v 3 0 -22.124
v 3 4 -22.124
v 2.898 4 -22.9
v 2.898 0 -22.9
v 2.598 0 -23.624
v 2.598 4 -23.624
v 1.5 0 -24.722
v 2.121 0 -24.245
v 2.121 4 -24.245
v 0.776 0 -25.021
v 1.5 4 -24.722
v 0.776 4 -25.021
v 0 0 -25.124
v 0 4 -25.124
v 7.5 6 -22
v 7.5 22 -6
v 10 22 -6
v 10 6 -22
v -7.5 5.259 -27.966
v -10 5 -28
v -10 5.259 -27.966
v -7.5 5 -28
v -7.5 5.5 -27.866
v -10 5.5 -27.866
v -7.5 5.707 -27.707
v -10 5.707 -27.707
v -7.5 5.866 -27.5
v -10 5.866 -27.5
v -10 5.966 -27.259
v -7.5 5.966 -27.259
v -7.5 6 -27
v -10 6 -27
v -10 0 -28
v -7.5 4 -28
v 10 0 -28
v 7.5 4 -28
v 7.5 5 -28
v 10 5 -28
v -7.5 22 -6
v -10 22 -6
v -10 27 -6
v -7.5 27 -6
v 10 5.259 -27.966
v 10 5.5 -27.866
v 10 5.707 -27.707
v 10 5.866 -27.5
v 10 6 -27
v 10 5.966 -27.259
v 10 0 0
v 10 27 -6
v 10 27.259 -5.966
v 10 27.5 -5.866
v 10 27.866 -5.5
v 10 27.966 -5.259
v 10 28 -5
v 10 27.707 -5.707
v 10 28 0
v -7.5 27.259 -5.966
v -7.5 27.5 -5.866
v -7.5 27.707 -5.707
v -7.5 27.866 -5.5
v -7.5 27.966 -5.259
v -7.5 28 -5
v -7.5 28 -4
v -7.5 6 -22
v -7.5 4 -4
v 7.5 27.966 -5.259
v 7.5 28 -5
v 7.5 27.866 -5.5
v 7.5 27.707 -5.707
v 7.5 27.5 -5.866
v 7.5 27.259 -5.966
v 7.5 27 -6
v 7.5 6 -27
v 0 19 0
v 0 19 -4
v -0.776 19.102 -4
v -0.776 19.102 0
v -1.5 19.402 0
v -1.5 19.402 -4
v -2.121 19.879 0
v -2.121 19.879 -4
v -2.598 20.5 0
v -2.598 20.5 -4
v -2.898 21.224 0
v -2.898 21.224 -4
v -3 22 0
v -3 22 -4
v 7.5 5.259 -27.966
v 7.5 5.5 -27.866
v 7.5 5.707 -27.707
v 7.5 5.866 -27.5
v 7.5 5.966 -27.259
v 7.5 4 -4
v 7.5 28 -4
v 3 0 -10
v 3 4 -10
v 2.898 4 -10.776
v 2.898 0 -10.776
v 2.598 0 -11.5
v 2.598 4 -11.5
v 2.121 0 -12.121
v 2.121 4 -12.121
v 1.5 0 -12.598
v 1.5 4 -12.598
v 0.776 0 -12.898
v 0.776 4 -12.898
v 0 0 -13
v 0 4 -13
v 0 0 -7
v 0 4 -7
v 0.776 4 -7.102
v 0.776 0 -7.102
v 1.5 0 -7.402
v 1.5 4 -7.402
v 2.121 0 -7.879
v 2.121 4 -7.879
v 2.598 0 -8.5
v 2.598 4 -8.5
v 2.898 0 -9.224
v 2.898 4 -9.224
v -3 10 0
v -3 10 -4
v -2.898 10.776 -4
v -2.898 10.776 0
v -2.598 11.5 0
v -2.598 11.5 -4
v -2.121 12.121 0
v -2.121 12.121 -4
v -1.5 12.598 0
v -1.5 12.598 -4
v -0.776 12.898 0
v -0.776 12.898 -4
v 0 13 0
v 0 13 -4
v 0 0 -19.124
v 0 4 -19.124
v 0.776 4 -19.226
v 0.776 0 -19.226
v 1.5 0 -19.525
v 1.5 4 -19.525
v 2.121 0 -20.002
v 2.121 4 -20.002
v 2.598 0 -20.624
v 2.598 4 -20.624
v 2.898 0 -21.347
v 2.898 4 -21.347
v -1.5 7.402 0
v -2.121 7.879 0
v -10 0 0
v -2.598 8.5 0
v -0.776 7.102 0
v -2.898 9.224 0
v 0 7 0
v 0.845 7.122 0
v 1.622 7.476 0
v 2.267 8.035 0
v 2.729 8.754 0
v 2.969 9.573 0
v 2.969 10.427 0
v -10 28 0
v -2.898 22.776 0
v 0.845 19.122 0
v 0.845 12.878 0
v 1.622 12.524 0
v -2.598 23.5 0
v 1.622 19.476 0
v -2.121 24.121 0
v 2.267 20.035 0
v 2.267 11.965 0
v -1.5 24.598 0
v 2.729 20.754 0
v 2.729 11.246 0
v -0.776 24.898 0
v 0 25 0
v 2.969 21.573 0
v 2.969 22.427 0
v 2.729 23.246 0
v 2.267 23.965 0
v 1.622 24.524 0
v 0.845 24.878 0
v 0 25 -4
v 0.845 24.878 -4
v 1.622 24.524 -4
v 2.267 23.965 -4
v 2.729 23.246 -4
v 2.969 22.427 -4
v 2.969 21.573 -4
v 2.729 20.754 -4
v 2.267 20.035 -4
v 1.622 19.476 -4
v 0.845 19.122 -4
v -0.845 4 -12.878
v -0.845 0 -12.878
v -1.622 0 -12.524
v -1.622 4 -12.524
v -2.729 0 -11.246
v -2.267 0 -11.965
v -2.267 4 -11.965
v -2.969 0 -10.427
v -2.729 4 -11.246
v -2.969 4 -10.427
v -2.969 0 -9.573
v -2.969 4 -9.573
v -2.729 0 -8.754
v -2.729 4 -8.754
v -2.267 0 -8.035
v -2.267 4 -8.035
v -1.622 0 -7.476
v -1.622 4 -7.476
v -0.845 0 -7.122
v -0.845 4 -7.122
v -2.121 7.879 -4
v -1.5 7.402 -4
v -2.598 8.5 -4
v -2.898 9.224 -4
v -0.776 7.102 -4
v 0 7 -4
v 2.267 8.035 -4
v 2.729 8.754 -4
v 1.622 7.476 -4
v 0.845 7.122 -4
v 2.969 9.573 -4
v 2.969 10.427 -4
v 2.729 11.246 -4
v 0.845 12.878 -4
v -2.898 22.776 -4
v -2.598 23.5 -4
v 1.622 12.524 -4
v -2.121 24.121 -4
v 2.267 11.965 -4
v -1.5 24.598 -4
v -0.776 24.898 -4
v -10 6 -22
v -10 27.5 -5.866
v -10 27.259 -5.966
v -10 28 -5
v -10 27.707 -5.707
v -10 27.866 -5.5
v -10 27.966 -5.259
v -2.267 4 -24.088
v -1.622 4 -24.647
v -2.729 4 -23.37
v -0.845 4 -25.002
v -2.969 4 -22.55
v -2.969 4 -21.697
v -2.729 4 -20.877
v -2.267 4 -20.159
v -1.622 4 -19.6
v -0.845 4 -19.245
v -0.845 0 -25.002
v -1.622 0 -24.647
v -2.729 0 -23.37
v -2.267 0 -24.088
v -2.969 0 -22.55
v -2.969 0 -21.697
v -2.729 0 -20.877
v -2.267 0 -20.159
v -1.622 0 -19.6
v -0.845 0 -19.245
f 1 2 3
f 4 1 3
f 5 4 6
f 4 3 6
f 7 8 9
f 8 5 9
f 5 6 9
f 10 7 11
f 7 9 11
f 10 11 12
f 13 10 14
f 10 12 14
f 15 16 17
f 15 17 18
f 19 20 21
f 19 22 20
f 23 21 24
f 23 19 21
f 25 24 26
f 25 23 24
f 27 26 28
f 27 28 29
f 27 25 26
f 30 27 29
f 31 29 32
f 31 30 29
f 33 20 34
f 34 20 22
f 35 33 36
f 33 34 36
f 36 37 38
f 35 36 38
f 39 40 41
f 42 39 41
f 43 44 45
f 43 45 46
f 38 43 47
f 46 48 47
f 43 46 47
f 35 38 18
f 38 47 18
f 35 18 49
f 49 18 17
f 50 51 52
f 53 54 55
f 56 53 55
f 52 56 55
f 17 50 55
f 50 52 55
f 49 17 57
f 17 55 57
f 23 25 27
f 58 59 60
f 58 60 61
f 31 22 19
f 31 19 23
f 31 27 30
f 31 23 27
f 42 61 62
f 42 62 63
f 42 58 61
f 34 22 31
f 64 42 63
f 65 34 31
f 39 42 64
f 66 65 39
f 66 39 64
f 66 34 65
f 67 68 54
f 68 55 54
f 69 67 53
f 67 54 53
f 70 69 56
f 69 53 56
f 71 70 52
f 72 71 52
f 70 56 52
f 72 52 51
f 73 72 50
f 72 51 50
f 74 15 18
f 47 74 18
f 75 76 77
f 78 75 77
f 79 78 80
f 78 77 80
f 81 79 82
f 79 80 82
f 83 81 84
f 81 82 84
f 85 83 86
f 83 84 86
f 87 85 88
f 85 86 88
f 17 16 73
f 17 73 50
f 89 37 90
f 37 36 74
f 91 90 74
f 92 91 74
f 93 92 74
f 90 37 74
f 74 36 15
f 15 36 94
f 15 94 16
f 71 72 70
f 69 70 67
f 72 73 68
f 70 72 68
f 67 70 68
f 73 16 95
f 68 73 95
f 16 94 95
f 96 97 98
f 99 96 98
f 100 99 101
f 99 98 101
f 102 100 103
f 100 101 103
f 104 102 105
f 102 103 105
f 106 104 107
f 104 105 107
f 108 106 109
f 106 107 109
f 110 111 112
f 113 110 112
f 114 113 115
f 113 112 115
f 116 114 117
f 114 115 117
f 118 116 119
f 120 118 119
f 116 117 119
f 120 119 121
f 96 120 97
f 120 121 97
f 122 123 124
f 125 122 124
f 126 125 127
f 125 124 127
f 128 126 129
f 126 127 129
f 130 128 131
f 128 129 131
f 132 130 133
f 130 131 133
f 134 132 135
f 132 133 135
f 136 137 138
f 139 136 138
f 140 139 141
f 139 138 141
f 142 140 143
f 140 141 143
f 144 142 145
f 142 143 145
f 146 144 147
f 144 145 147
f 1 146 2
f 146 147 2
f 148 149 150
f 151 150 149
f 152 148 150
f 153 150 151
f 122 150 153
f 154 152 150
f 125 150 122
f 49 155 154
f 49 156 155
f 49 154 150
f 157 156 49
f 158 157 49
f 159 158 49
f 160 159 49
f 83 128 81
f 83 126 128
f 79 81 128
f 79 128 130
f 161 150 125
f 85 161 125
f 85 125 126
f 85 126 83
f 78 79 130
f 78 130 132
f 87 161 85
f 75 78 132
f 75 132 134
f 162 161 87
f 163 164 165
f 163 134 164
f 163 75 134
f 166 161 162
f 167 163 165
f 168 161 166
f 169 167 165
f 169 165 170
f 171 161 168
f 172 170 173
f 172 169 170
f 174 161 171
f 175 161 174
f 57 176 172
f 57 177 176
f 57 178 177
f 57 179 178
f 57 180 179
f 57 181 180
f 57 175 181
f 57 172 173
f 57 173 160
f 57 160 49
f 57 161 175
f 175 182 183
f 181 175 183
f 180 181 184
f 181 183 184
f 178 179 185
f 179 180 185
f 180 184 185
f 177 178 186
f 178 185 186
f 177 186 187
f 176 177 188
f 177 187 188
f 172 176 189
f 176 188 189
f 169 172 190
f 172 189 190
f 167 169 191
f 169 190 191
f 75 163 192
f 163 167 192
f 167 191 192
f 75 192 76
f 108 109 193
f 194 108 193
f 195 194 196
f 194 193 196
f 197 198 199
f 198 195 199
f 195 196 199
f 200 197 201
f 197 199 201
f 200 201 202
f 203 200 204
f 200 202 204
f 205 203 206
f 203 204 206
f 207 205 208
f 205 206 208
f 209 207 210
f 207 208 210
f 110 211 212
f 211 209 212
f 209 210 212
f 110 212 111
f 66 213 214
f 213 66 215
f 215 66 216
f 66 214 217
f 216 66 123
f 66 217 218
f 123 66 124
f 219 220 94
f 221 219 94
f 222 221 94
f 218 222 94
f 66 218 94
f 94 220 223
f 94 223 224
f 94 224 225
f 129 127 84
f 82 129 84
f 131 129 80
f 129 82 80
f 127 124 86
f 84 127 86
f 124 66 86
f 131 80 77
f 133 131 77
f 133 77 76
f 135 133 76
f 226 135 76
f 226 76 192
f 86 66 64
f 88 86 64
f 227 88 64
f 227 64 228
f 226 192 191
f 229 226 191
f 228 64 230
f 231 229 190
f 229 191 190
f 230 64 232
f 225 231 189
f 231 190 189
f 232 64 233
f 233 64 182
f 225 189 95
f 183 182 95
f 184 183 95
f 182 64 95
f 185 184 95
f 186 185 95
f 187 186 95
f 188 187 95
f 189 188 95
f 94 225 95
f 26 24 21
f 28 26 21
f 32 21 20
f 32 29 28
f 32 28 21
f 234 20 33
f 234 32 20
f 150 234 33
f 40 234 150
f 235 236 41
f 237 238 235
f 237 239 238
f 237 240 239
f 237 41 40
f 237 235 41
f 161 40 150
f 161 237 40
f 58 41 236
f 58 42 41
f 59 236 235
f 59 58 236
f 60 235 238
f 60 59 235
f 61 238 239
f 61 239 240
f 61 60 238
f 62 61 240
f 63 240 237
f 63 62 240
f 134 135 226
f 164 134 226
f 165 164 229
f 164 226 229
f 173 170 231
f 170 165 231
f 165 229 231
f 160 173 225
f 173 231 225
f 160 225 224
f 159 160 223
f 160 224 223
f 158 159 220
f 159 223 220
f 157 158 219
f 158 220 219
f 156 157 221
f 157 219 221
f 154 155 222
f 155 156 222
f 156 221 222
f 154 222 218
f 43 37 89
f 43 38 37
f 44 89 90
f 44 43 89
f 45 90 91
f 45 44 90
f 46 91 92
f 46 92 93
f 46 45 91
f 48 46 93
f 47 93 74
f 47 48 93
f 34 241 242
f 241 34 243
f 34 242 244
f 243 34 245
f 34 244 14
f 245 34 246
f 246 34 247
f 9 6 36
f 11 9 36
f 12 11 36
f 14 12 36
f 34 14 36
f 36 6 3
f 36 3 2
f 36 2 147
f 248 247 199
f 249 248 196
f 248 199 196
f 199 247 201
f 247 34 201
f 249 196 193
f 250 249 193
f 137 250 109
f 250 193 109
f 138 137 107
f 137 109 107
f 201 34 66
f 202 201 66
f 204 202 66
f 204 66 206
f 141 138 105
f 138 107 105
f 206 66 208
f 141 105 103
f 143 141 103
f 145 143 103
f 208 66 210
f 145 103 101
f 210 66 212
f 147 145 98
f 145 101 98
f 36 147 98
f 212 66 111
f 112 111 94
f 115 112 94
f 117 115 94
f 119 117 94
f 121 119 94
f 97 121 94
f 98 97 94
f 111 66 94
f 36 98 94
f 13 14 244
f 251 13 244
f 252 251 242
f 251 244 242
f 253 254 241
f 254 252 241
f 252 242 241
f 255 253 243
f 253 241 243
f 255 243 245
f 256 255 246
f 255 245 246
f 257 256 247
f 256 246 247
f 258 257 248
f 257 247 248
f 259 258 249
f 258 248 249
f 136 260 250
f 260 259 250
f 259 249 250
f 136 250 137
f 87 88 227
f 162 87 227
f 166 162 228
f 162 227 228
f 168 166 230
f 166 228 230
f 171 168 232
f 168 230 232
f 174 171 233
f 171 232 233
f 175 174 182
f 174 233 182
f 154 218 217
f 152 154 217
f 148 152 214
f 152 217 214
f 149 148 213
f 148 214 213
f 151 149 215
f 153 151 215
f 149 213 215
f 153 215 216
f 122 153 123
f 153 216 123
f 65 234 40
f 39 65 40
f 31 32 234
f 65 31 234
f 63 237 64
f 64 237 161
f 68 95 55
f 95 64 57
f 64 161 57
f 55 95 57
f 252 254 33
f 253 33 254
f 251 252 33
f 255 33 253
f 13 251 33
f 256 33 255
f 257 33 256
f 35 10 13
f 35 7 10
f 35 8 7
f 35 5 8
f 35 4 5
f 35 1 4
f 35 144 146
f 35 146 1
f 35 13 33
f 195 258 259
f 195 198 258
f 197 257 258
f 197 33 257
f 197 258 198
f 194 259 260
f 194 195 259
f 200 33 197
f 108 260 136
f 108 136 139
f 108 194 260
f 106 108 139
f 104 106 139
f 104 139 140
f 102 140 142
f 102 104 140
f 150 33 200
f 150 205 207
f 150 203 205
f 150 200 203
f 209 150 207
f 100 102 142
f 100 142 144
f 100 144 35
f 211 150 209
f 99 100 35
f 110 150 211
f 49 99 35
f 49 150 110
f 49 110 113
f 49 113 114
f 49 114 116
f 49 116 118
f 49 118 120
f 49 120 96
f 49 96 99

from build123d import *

# Parameters (mm, degrees)
SKETCH1_W               = 17.5
SKETCH1_H               = 16
BOSS_EXTRUDE1_DEPTH     = 6
SKETCH2_W               = 2.5
SKETCH2_H               = 16
BOSS_EXTRUDE2_DEPTH     = 22
BOSS_EXTRUDE3_DEPTH     = 2.5
BOSS_EXTRUDE4_DEPTH     = 6
SKETCH5_W               = 20
SKETCH5_H               = 28
BOSS_EXTRUDE5_DEPTH     = 6
CUT_EXTRUDE1_REACH      = 40.21
SKETCH7_W               = 15
SKETCH7_H               = 22
CUT_EXTRUDE2_REACH      = 40.21
SKETCH9_W               = 15
SKETCH9_H               = 24
CUT_EXTRUDE3_DEPTH      = 45.362146026
CUT_EXTRUDE4_DEPTH      = 39.209946349
CUT_EXTRUDE5_DEPTH      = 41.841155713
BOSS_EXTRUDE6_DEPTH     = 6
BOSS_EXTRUDE7_DEPTH     = 6
BOSS_EXTRUDE8_DEPTH     = 6
BOSS_EXTRUDE9_DEPTH     = 6
FILLET1_R               = 1
SKETCH17_W              = 15
SKETCH17_H              = 24
BOSS_EXTRUDE10_DEPTH    = 4
SKETCH18_W              = 15
SKETCH18_H              = 24
BOSS_EXTRUDE11_DEPTH    = 4
CUT_EXTRUDE6_DEPTH      = 10
CUT_EXTRUDE7_DEPTH      = 10
CUT_EXTRUDE8_DEPTH      = 39.52596527
CUT_EXTRUDE8_DEPTH_BACK = 39.52596527
SKETCH21_W              = 6
SKETCH21_H              = 1.6
CUT_EXTRUDE9_DEPTH      = 39.52596527
CUT_EXTRUDE9_DEPTH_BACK = 39.52596527
SKETCH22_W              = 6
SKETCH22_H              = 1.6


with BuildPart() as part:
    # Sketch1 → Boss-Extrude1 (new body)
    with BuildSketch(Plane.XY):
        with Locations((-1.25, 14)):
            Rectangle(SKETCH1_W, SKETCH1_H)
    extrude(amount=-BOSS_EXTRUDE1_DEPTH)

    # Sketch2 → Boss-Extrude2 (add)
    with BuildSketch(Plane(origin=(0, 0, -6), x_dir=(-1, 0, 0), z_dir=(0, 0, -1))):
        with Locations((8.75, 14)):
            Rectangle(SKETCH2_W, SKETCH2_H)
    extrude(amount=BOSS_EXTRUDE2_DEPTH)

    # Sketch3 → Boss-Extrude3 (add)
    with BuildSketch(Plane(origin=(7.5, 0, 0), x_dir=(0, 0, -1), z_dir=(1, 0, 0))):
        Polygon((6, 22), (22, 6), (0, 6), (0, 22), align=None)
    extrude(amount=BOSS_EXTRUDE3_DEPTH)

    # Sketch4 → Boss-Extrude4 (add)
    with BuildSketch(Plane(origin=(0, 22, 0), x_dir=(-1, 0, 0), z_dir=(0, 1, 0))):
        Polygon((7.5, -6), (-10, -6), (-10, 0), (10, 0), (10, -28), (7.5, -28), align=None)
    extrude(amount=BOSS_EXTRUDE4_DEPTH)

    # Sketch5 → Boss-Extrude5 (add)
    with BuildSketch(Plane.XZ.offset(-6)):
        with Locations((0, -14)):
            Rectangle(SKETCH5_W, SKETCH5_H)
    extrude(amount=BOSS_EXTRUDE5_DEPTH)

    # Sketch7 → Cut-Extrude1 (cut, up to next)
    with BuildSketch(Plane.XY.offset(-4), mode=Mode.PRIVATE) as cut_extrude1_sk1:
        with Locations((0, 17)):
            Rectangle(SKETCH7_W, SKETCH7_H)
    cut_extrude1_tool1 = extrude(cut_extrude1_sk1.sketch, amount=-CUT_EXTRUDE1_REACH, mode=Mode.PRIVATE) & part.part
    add(cut_extrude1_tool1.solids().sort_by_distance((0, 17, -4))[0], mode=Mode.SUBTRACT)

    # Sketch9 → Cut-Extrude2 (cut, up to next)
    with BuildSketch(Plane.XZ.offset(-4), mode=Mode.PRIVATE) as cut_extrude2_sk1:
        with Locations((0, -16)):
            Rectangle(SKETCH9_W, SKETCH9_H)
    cut_extrude2_tool1 = extrude(cut_extrude2_sk1.sketch, amount=-CUT_EXTRUDE2_REACH, mode=Mode.PRIVATE) & part.part
    add(cut_extrude2_tool1.solids().sort_by_distance((0, 4, -16))[0], mode=Mode.SUBTRACT)

    # Sketch10 → Cut-Extrude3 (cut, through all)
    with BuildSketch(Plane.ZY.offset(10)):
        Polygon((-28, 28), (-28, 6), (-22, 6), (-6, 22), (-6, 28), align=None)
    extrude(amount=-CUT_EXTRUDE3_DEPTH, mode=Mode.SUBTRACT)

    # Sketch11 → Cut-Extrude4 (cut, through all)
    with BuildSketch(Plane(origin=(0, 0, -4), x_dir=(-1, 0, 0), z_dir=(0, 0, -1))):
        with BuildLine():
            Line((3.25, 12.5), (3.25, 18))
            ThreePointArc((3.25, 18), (0, 21.25), (-3.25, 18))
            Line((-3.25, 18), (-3.25, 12.5))
            ThreePointArc((-3.25, 12.5), (0, 9.25), (3.25, 12.5))
        make_face()
    extrude(amount=-CUT_EXTRUDE4_DEPTH, mode=Mode.SUBTRACT)

    # Sketch12 → Cut-Extrude5 (cut, through all)
    with BuildSketch(Plane.XZ):
        with BuildLine():
            Line((3.25, -18), (3.25, -12.5))
            ThreePointArc((3.25, -12.5), (0, -9.25), (-3.25, -12.5))
            Line((-3.25, -12.5), (-3.25, -18))
            ThreePointArc((-3.25, -18), (0, -21.25), (3.25, -18))
        make_face()
    extrude(amount=-CUT_EXTRUDE5_DEPTH, mode=Mode.SUBTRACT)

    # Sketch13 → Boss-Extrude6 (add)
    with BuildSketch(Plane(origin=(3, 0, 0), x_dir=(0, 0, -1), z_dir=(1, 0, 0))):
        Polygon((0, 26.5), (-1.6, 24.9), (-1.6, 23.5), (0, 23.5), align=None)
    extrude(amount=-BOSS_EXTRUDE6_DEPTH)

    # Sketch14 → Boss-Extrude7 (add)
    with BuildSketch(Plane(origin=(3, 0, 0), x_dir=(0, 0, -1), z_dir=(1, 0, 0))):
        Polygon((0, 6.5), (-1.6, 4.9), (-1.6, 3.5), (0, 3.5), align=None)
    extrude(amount=-BOSS_EXTRUDE7_DEPTH)

    # Sketch15 → Boss-Extrude8 (add)
    with BuildSketch(Plane(origin=(3, 0, 0), x_dir=(0, 0, -1), z_dir=(1, 0, 0))):
        Polygon((23.5, 0), (23.5, -1.6), (24.9, -1.6), (26.5, 0), align=None)
    extrude(amount=-BOSS_EXTRUDE8_DEPTH)

    # Sketch16 → Boss-Extrude9 (add)
    with BuildSketch(Plane(origin=(3, 0, 0), x_dir=(0, 0, -1), z_dir=(1, 0, 0))):
        Polygon((3.5, 0), (3.5, -1.6), (4.9, -1.6), (6.5, 0), align=None)
    extrude(amount=-BOSS_EXTRUDE9_DEPTH)

    # Fillet1
    fillet1_edges = [part.edges().sort_by_distance(p)[0] for p in [
        (-8.75, 6, -28),
        (8.75, 28, -6),
        (8.75, 6, -28),
        (-8.75, 28, -6),
    ]]
    fillet(fillet1_edges, radius=FILLET1_R)

    # Sketch17 → Boss-Extrude10 (add)
    with BuildSketch(Plane(origin=(0, 4, 0), x_dir=(1, 0, 0), z_dir=(0, 1, 0))):
        with Locations((0, 16)):
            Rectangle(SKETCH17_W, SKETCH17_H)
    extrude(amount=-BOSS_EXTRUDE10_DEPTH)

    # Sketch18 → Boss-Extrude11 (add)
    with BuildSketch(Plane(origin=(0, 0, -4), x_dir=(-1, 0, 0), z_dir=(0, 0, -1))):
        with Locations((0, 16)):
            Rectangle(SKETCH18_W, SKETCH18_H)
    extrude(amount=-BOSS_EXTRUDE11_DEPTH)

    # Sketch20 → Cut-Extrude6 (cut)
    with BuildSketch(Plane(origin=(0, 0, -4), x_dir=(-1, 0, 0), z_dir=(0, 0, -1))):
        with BuildLine():
            ThreePointArc((3, 22), (2.121320344, 24.121320344), (0, 25))
            Line((0, 25), (0, 22))
            Line((0, 22), (0, 19))
            ThreePointArc((0, 19), (2.121320344, 19.878679656), (3, 22))
        make_face()
        with BuildLine():
            Line((0, 22), (0, 25))
            ThreePointArc((0, 25), (-3, 22), (0, 19))
            Line((0, 19), (0, 22))
        make_face()
        with BuildLine():
            ThreePointArc((3, 10), (2.121320344, 12.121320344), (0, 13))
            Line((0, 13), (0, 10))
            Line((0, 10), (0, 7))
            ThreePointArc((0, 7), (2.121320344, 7.878679656), (3, 10))
        make_face()
        with BuildLine():
            Line((0, 10), (0, 13))
            ThreePointArc((0, 13), (-3, 10), (0, 7))
            Line((0, 7), (0, 10))
        make_face()
    extrude(amount=-CUT_EXTRUDE6_DEPTH, mode=Mode.SUBTRACT)

    # Sketch19 → Cut-Extrude7 (cut)
    with BuildSketch(Plane(origin=(0, 4, 0), x_dir=(1, 0, 0), z_dir=(0, 1, 0))):
        with BuildLine():
            Line((0, 19.123546409), (0, 22))
            Line((0, 22), (0, 22.123546409))
            Line((0, 22.123546409), (0, 25.123546409))
            ThreePointArc((0, 25.123546409), (-3, 22.123546409), (0, 19.123546409))
        make_face()
        with BuildLine():
            Line((0, 22.123546409), (0, 22))
            Line((0, 22), (0, 19.123546409))
            ThreePointArc((0, 19.123546409), (2.121320344, 20.002226065), (3, 22.123546409))
            ThreePointArc((3, 22.123546409), (2.121320344, 24.244866752), (0, 25.123546409))
            Line((0, 25.123546409), (0, 22.123546409))
        make_face()
        with BuildLine():
            ThreePointArc((3, 10), (2.121320344, 12.121320344), (0, 13))
            Line((0, 13), (0, 10))
            Line((0, 10), (0, 7))
            ThreePointArc((0, 7), (2.121320344, 7.878679656), (3, 10))
        make_face()
        with BuildLine():
            Line((0, 10), (0, 13))
            ThreePointArc((0, 13), (-3, 10), (0, 7))
            Line((0, 7), (0, 10))
        make_face()
    extrude(amount=-CUT_EXTRUDE7_DEPTH, mode=Mode.SUBTRACT)

    # Sketch21 → Cut-Extrude8 (cut, two sides: drawn at the far end of the back side and taken through both)
    with BuildSketch(Plane.XZ.offset(-3.5).offset(-CUT_EXTRUDE8_DEPTH_BACK)):
        with Locations((0, 0.8)):
            Rectangle(SKETCH21_W, SKETCH21_H)
    extrude(amount=CUT_EXTRUDE8_DEPTH + CUT_EXTRUDE8_DEPTH_BACK, mode=Mode.SUBTRACT)

    # Sketch22 → Cut-Extrude9 (cut, two sides: drawn at the far end of the back side and taken through both)
    with BuildSketch(Plane.XY.offset(-3.5).offset(-CUT_EXTRUDE9_DEPTH_BACK)):
        with Locations((0, -0.8)):
            Rectangle(SKETCH22_W, SKETCH22_H)
    extrude(amount=CUT_EXTRUDE9_DEPTH + CUT_EXTRUDE9_DEPTH_BACK, mode=Mode.SUBTRACT)


solid = part.part
